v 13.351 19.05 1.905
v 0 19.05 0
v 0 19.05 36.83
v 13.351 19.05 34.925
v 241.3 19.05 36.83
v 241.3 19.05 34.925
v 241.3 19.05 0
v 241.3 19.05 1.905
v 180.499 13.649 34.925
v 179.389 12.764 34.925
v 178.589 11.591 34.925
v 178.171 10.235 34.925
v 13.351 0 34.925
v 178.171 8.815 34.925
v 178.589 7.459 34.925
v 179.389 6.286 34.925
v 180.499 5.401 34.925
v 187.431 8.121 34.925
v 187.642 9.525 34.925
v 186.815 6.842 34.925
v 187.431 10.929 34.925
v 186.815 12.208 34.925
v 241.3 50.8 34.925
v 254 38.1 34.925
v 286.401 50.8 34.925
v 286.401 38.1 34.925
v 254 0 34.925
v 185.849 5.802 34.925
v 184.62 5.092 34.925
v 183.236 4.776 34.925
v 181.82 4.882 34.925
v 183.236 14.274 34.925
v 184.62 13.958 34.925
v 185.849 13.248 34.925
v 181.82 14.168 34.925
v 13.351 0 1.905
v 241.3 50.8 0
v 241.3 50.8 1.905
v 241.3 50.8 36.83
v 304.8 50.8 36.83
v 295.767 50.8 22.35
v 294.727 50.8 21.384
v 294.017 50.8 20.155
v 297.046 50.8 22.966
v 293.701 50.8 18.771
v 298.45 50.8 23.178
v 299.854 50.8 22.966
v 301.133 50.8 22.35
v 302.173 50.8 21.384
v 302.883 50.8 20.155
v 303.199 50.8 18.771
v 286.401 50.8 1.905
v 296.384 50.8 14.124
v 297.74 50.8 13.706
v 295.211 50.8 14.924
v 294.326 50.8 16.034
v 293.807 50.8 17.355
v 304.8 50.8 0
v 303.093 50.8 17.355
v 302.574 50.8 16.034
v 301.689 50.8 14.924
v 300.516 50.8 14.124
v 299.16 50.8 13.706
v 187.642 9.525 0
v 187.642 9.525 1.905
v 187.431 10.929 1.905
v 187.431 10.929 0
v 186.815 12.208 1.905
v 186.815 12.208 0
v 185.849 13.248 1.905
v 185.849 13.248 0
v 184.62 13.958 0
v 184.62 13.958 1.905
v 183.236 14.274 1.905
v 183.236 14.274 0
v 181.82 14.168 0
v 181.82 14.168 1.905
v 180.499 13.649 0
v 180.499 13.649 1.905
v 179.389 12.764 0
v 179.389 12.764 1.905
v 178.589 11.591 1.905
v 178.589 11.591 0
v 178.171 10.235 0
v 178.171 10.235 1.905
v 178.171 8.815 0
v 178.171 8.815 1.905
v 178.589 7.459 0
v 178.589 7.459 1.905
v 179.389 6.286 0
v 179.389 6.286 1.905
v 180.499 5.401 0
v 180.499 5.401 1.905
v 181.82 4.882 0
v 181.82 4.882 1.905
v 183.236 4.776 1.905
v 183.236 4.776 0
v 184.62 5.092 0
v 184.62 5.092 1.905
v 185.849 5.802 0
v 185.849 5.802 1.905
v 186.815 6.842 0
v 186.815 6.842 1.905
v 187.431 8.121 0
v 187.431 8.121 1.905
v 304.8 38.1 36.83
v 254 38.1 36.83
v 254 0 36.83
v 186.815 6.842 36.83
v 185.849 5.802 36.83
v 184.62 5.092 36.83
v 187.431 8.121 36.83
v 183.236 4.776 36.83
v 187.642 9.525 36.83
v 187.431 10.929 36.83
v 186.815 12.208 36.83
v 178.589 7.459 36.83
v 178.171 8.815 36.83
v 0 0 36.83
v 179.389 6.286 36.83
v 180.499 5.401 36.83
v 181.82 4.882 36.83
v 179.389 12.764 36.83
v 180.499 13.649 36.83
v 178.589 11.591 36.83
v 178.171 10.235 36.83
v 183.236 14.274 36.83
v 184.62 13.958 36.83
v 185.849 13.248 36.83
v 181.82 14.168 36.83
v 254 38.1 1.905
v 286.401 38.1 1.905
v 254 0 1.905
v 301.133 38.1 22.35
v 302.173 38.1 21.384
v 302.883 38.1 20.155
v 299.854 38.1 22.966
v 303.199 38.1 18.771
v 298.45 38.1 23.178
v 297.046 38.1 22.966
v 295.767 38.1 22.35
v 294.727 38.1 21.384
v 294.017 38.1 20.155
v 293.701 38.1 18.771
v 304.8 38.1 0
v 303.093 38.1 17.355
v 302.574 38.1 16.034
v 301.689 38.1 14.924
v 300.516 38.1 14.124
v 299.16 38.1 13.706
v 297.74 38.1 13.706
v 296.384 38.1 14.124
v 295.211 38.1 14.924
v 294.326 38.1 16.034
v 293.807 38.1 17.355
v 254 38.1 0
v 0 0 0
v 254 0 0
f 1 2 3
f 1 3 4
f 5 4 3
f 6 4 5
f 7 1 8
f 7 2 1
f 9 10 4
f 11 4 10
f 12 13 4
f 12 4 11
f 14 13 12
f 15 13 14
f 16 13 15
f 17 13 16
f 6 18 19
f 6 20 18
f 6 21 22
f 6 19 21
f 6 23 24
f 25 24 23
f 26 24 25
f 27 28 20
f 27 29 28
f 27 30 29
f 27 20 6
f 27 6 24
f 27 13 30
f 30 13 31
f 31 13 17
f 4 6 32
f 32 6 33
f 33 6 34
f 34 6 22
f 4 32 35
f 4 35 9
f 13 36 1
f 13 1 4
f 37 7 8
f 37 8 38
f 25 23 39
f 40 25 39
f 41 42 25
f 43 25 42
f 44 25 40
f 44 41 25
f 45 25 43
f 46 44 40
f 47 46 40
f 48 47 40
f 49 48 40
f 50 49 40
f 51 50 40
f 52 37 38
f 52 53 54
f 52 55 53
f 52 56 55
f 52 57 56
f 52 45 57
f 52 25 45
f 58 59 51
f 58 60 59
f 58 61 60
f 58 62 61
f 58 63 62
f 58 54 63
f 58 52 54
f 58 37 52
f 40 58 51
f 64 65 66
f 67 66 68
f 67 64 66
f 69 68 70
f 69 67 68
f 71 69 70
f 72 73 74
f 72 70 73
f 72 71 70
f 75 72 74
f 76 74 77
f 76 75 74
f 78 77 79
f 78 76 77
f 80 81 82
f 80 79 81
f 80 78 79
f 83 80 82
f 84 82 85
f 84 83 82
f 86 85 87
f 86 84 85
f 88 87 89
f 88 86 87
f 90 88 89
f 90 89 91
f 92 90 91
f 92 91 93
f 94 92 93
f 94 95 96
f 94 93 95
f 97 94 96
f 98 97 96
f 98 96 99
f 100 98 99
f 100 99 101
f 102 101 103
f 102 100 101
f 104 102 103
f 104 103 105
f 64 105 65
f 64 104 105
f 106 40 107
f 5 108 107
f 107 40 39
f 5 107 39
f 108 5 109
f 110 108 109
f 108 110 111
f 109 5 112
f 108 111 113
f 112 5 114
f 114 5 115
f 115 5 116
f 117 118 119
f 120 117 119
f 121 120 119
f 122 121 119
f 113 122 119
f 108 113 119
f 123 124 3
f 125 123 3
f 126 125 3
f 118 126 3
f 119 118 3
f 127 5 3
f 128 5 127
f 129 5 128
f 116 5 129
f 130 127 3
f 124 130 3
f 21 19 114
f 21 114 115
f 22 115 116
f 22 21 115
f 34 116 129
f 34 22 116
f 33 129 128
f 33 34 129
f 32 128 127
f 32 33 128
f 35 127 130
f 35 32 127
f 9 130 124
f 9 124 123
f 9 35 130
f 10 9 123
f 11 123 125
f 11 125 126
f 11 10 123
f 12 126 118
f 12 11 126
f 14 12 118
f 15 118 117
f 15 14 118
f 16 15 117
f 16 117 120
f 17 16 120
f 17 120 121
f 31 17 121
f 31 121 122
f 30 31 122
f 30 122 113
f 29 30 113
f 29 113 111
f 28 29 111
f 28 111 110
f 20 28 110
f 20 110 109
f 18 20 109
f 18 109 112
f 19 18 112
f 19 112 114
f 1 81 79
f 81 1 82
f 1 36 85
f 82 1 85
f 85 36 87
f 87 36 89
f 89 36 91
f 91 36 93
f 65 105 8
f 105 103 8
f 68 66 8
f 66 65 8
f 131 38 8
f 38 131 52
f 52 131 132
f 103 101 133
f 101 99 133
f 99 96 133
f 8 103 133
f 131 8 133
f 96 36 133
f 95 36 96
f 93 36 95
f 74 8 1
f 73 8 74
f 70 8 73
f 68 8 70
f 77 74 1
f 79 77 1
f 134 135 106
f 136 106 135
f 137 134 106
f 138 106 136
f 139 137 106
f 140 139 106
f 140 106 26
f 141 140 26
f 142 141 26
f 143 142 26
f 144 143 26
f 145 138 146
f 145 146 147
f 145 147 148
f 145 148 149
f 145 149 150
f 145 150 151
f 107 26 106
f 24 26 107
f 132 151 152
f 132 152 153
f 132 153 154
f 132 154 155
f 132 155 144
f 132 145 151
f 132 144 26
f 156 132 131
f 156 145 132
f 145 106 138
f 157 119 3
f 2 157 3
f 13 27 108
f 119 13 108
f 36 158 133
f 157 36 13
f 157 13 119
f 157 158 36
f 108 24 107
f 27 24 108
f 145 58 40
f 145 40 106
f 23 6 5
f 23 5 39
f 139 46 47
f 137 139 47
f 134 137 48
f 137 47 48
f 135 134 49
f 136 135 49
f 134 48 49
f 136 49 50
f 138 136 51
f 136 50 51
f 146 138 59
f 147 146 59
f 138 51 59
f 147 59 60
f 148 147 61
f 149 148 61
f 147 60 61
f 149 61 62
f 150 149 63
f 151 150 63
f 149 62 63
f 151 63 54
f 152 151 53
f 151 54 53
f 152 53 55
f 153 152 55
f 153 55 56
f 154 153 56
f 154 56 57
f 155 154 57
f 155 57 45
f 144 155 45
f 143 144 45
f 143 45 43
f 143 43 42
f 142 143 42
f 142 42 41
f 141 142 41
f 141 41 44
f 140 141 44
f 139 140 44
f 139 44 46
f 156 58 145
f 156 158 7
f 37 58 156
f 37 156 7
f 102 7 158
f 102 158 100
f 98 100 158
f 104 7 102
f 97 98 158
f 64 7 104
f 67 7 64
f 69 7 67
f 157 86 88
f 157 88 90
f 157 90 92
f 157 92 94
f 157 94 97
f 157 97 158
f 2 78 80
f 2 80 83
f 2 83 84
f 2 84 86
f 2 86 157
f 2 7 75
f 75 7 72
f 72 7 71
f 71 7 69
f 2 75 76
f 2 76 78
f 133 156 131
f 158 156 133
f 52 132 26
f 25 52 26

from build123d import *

# Parameters (mm, degrees)
SKETCH1_R           = 4.7625
BOSS_EXTRUDE1_DEPTH = 36.83
SKETCH2_W           = 273.05
SKETCH2_H           = 33.02
CUT_EXTRUDE1_DEPTH  = 312.191466625
SKETCH4_R           = 4.7625
CUT_EXTRUDE3_DEPTH  = 312.191466625


with BuildPart() as part:
    # Sketch1 → Boss-Extrude1 (new body)
    with BuildSketch(Plane.XY):
        Polygon((304.8, 50.8), (304.8, 38.1), (254, 38.1), (254, 0), (0, 0), (0, 19.05), (241.3, 19.05), (241.3, 50.8), align=None)
        with Locations((182.88, 9.525)):
            Circle(SKETCH1_R, mode=Mode.SUBTRACT)
    extrude(amount=BOSS_EXTRUDE1_DEPTH)

    # Sketch2 → Cut-Extrude1 (cut, through all)
    with BuildSketch(Plane.XZ):
        with Locations((149.876052358, 18.415)):
            Rectangle(SKETCH2_W, SKETCH2_H)
    extrude(amount=-CUT_EXTRUDE1_DEPTH, mode=Mode.SUBTRACT)

    # Sketch4 → Cut-Extrude3 (cut, through all)
    with BuildSketch(Plane(origin=(0, 50.8, 0), x_dir=(1, 0, 0), z_dir=(0, 1, 0))):
        with Locations(Location((298.45, -18.415, 0), (0, 0, 270))):
            Circle(SKETCH4_R)
    extrude(amount=-CUT_EXTRUDE3_DEPTH, mode=Mode.SUBTRACT)


solid = part.part
